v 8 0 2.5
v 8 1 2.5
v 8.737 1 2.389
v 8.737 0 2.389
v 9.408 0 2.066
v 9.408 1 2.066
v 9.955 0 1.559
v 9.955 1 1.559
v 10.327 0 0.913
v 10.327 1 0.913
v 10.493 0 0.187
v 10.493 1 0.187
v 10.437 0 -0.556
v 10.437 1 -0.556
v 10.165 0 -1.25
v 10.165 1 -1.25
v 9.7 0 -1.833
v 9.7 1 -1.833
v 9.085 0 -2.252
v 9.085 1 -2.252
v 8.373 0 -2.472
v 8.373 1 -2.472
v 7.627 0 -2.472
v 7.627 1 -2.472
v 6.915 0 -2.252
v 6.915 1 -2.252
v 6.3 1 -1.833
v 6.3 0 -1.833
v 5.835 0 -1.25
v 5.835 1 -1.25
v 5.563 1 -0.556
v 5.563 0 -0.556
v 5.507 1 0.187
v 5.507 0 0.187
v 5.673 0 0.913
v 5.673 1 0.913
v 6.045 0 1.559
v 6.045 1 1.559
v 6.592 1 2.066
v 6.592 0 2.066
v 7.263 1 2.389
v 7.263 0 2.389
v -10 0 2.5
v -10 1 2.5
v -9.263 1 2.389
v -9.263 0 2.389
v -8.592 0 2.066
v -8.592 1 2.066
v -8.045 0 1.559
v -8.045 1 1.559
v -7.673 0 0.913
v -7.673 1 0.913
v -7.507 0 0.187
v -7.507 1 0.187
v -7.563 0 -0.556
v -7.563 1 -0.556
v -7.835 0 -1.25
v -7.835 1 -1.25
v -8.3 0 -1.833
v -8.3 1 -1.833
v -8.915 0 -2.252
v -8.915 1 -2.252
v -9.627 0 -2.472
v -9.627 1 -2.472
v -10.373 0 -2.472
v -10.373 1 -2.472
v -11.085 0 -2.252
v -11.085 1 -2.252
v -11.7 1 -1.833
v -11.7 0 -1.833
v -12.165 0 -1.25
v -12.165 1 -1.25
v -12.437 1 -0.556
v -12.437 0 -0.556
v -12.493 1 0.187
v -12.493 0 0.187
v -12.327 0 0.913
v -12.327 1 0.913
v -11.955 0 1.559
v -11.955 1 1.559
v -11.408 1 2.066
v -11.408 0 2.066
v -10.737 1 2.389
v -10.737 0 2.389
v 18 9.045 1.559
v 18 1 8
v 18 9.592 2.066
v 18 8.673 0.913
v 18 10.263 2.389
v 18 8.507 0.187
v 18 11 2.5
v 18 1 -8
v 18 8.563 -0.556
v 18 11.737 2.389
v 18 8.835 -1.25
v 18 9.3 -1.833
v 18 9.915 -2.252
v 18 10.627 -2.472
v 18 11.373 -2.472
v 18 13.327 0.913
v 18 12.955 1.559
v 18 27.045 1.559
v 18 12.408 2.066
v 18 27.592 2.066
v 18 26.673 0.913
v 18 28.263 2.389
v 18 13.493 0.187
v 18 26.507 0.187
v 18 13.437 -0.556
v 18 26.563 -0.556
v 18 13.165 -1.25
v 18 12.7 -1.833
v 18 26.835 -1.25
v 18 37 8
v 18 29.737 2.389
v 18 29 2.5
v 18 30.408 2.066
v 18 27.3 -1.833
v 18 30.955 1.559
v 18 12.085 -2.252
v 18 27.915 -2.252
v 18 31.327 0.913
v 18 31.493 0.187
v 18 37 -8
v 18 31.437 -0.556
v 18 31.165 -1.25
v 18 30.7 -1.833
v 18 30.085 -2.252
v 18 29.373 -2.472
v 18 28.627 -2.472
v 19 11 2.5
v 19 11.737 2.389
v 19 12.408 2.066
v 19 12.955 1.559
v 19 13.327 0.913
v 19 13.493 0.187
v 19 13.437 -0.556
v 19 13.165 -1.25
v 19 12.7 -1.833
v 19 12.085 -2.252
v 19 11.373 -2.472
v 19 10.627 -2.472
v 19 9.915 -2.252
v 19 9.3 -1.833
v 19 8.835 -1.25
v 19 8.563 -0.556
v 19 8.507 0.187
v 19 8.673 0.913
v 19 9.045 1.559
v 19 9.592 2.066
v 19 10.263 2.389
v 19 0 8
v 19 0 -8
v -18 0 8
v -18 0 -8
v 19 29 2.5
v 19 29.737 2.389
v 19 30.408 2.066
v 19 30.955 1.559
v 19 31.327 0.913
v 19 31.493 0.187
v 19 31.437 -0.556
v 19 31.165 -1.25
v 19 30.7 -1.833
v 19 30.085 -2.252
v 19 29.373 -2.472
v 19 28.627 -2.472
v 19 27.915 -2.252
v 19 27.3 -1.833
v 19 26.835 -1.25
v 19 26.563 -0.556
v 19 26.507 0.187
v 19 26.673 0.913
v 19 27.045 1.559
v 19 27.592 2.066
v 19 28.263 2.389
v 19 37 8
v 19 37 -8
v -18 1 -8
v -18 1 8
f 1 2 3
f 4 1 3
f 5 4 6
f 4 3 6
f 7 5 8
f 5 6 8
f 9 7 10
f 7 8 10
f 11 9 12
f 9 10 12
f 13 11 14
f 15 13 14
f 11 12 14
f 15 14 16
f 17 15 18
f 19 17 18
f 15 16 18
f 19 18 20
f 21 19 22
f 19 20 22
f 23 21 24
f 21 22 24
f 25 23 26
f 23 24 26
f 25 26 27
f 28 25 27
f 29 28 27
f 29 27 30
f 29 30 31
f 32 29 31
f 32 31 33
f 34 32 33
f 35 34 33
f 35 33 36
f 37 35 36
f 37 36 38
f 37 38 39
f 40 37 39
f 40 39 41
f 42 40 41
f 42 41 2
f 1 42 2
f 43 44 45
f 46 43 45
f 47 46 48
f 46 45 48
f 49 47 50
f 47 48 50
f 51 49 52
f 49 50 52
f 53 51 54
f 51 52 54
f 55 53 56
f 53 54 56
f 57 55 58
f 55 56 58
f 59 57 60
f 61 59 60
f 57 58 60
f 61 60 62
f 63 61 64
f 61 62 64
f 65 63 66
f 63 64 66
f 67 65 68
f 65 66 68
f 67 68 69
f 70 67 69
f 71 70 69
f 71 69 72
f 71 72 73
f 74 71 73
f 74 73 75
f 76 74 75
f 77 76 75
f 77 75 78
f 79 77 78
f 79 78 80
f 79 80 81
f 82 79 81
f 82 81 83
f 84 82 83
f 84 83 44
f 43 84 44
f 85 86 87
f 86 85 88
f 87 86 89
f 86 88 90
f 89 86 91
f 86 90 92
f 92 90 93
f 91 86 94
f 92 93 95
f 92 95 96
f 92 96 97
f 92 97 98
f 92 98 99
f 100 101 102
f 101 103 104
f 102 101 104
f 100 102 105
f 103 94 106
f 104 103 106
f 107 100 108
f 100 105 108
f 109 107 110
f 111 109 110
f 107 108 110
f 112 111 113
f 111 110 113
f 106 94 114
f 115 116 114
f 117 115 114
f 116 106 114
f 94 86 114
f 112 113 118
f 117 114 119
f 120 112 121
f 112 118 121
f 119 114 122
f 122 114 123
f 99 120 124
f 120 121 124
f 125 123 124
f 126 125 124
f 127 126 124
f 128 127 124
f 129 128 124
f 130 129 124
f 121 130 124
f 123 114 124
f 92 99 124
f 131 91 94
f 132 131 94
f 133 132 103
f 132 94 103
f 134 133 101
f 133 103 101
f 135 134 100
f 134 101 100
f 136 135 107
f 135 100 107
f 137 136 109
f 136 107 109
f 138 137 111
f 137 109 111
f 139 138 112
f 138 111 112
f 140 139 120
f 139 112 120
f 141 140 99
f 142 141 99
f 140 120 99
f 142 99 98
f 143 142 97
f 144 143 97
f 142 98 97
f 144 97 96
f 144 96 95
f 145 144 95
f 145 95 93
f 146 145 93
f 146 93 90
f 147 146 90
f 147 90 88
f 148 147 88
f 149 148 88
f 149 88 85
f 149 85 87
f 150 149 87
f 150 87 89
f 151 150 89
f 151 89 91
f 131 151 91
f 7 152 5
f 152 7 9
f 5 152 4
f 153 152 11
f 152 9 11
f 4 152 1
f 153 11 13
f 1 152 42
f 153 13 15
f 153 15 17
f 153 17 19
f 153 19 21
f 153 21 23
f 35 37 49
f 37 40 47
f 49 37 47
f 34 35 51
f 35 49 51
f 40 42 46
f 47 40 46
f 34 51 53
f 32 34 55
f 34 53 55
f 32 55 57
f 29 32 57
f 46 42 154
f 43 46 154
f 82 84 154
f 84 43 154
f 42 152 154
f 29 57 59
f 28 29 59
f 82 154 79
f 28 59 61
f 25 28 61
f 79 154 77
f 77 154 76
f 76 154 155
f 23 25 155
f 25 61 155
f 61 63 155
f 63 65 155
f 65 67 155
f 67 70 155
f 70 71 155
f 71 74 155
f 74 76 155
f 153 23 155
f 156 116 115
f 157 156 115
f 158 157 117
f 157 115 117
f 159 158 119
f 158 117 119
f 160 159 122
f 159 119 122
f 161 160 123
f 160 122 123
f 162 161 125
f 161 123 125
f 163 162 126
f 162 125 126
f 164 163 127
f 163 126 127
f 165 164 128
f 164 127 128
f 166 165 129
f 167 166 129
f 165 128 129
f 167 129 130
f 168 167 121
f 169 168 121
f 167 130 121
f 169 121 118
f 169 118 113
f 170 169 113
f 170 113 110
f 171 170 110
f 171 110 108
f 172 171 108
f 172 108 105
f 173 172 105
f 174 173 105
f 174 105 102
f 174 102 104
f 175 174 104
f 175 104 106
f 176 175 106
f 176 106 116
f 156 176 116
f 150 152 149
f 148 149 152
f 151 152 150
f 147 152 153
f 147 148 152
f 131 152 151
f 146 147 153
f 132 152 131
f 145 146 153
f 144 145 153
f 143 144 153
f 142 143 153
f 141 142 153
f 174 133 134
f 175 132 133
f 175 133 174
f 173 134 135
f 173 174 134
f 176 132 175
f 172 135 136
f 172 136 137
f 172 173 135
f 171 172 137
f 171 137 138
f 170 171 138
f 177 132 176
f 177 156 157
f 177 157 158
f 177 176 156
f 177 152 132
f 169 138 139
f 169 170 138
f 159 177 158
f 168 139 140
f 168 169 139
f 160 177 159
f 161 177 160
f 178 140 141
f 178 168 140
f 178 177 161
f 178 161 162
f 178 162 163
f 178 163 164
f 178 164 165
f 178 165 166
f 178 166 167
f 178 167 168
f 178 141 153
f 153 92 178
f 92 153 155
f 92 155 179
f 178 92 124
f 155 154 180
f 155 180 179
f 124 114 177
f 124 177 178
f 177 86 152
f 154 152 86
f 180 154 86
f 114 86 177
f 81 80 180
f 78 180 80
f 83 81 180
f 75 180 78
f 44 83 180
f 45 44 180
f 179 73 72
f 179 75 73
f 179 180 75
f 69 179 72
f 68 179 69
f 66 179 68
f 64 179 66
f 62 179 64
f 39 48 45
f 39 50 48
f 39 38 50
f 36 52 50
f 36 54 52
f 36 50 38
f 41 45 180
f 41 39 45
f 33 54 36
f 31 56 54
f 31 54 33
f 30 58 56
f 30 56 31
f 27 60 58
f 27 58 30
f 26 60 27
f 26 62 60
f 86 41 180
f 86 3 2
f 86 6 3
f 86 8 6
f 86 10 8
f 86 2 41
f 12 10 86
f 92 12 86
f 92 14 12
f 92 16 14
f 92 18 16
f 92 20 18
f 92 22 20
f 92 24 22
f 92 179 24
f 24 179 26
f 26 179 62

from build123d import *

# Parameters (mm, degrees)
SKETCH_1_W          = 36
SKETCH_1_H          = 16
EXTRUDE_1_DEPTH     = 1
SKETCH_2_W          = 16
SKETCH_2_H          = 37
EXTRUDE_2_DEPTH     = 1
CUT_EXTRUDE_1_REACH = 43.485
SKETCH_3_R          = 2.5
CUT_EXTRUDE_2_REACH = 54.24
SKETCH_4_R          = 2.5


with BuildPart() as part:
    # 草圖1 → 填料-伸長1 (new body)
    with BuildSketch(Plane(origin=(0, 0, 0), x_dir=(1, 0, 0), z_dir=(0, 1, 0))):
        Rectangle(SKETCH_1_W, SKETCH_1_H)
    extrude(amount=EXTRUDE_1_DEPTH)

    # 草圖2 → 填料-伸長2 (add)
    with BuildSketch(Plane(origin=(18, 0, 0), x_dir=(0, 0, -1), z_dir=(1, 0, 0))):
        with Locations((0, 18.5)):
            Rectangle(SKETCH_2_W, SKETCH_2_H)
    extrude(amount=EXTRUDE_2_DEPTH)

    # 草圖3 → 除料-伸長1 (cut, up to next)
    with BuildSketch(Plane(origin=(0, 1, 0), x_dir=(1, 0, 0), z_dir=(0, 1, 0)), mode=Mode.PRIVATE) as cut_extrude_1_sk1:
        with Locations(Location((-10, 0, 0), (0, 0, 270))):
            Circle(SKETCH_3_R)
    cut_extrude_1_tool1 = extrude(cut_extrude_1_sk1.sketch, amount=-CUT_EXTRUDE_1_REACH, mode=Mode.PRIVATE) & part.part
    # 草圖3 → 除料-伸長1 (cut, up to next)
    with BuildSketch(Plane(origin=(0, 1, 0), x_dir=(1, 0, 0), z_dir=(0, 1, 0)), mode=Mode.PRIVATE) as cut_extrude_1_sk2:
        with Locations(Location((8, 0, 0), (0, 0, 270))):
            Circle(SKETCH_3_R)
    cut_extrude_1_tool2 = extrude(cut_extrude_1_sk2.sketch, amount=-CUT_EXTRUDE_1_REACH, mode=Mode.PRIVATE) & part.part
    add(cut_extrude_1_tool1.solids().sort_by_distance((-10, 1, 0))[0], mode=Mode.SUBTRACT)
    add(cut_extrude_1_tool2.solids().sort_by_distance((8, 1, 0))[0], mode=Mode.SUBTRACT)

    # 草圖4 → 除料-伸長2 (cut, up to next)
    with BuildSketch(Plane.ZY.offset(-18), mode=Mode.PRIVATE) as cut_extrude_2_sk1:
        with Locations((0, 29)):
            Circle(SKETCH_4_R)
    cut_extrude_2_tool1 = extrude(cut_extrude_2_sk1.sketch, amount=-CUT_EXTRUDE_2_REACH, mode=Mode.PRIVATE) & part.part
    # 草圖4 → 除料-伸長2 (cut, up to next)
    with BuildSketch(Plane.ZY.offset(-18), mode=Mode.PRIVATE) as cut_extrude_2_sk2:
        with Locations((0, 11)):
            Circle(SKETCH_4_R)
    cut_extrude_2_tool2 = extrude(cut_extrude_2_sk2.sketch, amount=-CUT_EXTRUDE_2_REACH, mode=Mode.PRIVATE) & part.part
    add(cut_extrude_2_tool1.solids().sort_by_distance((18, 29, 0))[0], mode=Mode.SUBTRACT)
    add(cut_extrude_2_tool2.solids().sort_by_distance((18, 11, 0))[0], mode=Mode.SUBTRACT)


solid = part.part
